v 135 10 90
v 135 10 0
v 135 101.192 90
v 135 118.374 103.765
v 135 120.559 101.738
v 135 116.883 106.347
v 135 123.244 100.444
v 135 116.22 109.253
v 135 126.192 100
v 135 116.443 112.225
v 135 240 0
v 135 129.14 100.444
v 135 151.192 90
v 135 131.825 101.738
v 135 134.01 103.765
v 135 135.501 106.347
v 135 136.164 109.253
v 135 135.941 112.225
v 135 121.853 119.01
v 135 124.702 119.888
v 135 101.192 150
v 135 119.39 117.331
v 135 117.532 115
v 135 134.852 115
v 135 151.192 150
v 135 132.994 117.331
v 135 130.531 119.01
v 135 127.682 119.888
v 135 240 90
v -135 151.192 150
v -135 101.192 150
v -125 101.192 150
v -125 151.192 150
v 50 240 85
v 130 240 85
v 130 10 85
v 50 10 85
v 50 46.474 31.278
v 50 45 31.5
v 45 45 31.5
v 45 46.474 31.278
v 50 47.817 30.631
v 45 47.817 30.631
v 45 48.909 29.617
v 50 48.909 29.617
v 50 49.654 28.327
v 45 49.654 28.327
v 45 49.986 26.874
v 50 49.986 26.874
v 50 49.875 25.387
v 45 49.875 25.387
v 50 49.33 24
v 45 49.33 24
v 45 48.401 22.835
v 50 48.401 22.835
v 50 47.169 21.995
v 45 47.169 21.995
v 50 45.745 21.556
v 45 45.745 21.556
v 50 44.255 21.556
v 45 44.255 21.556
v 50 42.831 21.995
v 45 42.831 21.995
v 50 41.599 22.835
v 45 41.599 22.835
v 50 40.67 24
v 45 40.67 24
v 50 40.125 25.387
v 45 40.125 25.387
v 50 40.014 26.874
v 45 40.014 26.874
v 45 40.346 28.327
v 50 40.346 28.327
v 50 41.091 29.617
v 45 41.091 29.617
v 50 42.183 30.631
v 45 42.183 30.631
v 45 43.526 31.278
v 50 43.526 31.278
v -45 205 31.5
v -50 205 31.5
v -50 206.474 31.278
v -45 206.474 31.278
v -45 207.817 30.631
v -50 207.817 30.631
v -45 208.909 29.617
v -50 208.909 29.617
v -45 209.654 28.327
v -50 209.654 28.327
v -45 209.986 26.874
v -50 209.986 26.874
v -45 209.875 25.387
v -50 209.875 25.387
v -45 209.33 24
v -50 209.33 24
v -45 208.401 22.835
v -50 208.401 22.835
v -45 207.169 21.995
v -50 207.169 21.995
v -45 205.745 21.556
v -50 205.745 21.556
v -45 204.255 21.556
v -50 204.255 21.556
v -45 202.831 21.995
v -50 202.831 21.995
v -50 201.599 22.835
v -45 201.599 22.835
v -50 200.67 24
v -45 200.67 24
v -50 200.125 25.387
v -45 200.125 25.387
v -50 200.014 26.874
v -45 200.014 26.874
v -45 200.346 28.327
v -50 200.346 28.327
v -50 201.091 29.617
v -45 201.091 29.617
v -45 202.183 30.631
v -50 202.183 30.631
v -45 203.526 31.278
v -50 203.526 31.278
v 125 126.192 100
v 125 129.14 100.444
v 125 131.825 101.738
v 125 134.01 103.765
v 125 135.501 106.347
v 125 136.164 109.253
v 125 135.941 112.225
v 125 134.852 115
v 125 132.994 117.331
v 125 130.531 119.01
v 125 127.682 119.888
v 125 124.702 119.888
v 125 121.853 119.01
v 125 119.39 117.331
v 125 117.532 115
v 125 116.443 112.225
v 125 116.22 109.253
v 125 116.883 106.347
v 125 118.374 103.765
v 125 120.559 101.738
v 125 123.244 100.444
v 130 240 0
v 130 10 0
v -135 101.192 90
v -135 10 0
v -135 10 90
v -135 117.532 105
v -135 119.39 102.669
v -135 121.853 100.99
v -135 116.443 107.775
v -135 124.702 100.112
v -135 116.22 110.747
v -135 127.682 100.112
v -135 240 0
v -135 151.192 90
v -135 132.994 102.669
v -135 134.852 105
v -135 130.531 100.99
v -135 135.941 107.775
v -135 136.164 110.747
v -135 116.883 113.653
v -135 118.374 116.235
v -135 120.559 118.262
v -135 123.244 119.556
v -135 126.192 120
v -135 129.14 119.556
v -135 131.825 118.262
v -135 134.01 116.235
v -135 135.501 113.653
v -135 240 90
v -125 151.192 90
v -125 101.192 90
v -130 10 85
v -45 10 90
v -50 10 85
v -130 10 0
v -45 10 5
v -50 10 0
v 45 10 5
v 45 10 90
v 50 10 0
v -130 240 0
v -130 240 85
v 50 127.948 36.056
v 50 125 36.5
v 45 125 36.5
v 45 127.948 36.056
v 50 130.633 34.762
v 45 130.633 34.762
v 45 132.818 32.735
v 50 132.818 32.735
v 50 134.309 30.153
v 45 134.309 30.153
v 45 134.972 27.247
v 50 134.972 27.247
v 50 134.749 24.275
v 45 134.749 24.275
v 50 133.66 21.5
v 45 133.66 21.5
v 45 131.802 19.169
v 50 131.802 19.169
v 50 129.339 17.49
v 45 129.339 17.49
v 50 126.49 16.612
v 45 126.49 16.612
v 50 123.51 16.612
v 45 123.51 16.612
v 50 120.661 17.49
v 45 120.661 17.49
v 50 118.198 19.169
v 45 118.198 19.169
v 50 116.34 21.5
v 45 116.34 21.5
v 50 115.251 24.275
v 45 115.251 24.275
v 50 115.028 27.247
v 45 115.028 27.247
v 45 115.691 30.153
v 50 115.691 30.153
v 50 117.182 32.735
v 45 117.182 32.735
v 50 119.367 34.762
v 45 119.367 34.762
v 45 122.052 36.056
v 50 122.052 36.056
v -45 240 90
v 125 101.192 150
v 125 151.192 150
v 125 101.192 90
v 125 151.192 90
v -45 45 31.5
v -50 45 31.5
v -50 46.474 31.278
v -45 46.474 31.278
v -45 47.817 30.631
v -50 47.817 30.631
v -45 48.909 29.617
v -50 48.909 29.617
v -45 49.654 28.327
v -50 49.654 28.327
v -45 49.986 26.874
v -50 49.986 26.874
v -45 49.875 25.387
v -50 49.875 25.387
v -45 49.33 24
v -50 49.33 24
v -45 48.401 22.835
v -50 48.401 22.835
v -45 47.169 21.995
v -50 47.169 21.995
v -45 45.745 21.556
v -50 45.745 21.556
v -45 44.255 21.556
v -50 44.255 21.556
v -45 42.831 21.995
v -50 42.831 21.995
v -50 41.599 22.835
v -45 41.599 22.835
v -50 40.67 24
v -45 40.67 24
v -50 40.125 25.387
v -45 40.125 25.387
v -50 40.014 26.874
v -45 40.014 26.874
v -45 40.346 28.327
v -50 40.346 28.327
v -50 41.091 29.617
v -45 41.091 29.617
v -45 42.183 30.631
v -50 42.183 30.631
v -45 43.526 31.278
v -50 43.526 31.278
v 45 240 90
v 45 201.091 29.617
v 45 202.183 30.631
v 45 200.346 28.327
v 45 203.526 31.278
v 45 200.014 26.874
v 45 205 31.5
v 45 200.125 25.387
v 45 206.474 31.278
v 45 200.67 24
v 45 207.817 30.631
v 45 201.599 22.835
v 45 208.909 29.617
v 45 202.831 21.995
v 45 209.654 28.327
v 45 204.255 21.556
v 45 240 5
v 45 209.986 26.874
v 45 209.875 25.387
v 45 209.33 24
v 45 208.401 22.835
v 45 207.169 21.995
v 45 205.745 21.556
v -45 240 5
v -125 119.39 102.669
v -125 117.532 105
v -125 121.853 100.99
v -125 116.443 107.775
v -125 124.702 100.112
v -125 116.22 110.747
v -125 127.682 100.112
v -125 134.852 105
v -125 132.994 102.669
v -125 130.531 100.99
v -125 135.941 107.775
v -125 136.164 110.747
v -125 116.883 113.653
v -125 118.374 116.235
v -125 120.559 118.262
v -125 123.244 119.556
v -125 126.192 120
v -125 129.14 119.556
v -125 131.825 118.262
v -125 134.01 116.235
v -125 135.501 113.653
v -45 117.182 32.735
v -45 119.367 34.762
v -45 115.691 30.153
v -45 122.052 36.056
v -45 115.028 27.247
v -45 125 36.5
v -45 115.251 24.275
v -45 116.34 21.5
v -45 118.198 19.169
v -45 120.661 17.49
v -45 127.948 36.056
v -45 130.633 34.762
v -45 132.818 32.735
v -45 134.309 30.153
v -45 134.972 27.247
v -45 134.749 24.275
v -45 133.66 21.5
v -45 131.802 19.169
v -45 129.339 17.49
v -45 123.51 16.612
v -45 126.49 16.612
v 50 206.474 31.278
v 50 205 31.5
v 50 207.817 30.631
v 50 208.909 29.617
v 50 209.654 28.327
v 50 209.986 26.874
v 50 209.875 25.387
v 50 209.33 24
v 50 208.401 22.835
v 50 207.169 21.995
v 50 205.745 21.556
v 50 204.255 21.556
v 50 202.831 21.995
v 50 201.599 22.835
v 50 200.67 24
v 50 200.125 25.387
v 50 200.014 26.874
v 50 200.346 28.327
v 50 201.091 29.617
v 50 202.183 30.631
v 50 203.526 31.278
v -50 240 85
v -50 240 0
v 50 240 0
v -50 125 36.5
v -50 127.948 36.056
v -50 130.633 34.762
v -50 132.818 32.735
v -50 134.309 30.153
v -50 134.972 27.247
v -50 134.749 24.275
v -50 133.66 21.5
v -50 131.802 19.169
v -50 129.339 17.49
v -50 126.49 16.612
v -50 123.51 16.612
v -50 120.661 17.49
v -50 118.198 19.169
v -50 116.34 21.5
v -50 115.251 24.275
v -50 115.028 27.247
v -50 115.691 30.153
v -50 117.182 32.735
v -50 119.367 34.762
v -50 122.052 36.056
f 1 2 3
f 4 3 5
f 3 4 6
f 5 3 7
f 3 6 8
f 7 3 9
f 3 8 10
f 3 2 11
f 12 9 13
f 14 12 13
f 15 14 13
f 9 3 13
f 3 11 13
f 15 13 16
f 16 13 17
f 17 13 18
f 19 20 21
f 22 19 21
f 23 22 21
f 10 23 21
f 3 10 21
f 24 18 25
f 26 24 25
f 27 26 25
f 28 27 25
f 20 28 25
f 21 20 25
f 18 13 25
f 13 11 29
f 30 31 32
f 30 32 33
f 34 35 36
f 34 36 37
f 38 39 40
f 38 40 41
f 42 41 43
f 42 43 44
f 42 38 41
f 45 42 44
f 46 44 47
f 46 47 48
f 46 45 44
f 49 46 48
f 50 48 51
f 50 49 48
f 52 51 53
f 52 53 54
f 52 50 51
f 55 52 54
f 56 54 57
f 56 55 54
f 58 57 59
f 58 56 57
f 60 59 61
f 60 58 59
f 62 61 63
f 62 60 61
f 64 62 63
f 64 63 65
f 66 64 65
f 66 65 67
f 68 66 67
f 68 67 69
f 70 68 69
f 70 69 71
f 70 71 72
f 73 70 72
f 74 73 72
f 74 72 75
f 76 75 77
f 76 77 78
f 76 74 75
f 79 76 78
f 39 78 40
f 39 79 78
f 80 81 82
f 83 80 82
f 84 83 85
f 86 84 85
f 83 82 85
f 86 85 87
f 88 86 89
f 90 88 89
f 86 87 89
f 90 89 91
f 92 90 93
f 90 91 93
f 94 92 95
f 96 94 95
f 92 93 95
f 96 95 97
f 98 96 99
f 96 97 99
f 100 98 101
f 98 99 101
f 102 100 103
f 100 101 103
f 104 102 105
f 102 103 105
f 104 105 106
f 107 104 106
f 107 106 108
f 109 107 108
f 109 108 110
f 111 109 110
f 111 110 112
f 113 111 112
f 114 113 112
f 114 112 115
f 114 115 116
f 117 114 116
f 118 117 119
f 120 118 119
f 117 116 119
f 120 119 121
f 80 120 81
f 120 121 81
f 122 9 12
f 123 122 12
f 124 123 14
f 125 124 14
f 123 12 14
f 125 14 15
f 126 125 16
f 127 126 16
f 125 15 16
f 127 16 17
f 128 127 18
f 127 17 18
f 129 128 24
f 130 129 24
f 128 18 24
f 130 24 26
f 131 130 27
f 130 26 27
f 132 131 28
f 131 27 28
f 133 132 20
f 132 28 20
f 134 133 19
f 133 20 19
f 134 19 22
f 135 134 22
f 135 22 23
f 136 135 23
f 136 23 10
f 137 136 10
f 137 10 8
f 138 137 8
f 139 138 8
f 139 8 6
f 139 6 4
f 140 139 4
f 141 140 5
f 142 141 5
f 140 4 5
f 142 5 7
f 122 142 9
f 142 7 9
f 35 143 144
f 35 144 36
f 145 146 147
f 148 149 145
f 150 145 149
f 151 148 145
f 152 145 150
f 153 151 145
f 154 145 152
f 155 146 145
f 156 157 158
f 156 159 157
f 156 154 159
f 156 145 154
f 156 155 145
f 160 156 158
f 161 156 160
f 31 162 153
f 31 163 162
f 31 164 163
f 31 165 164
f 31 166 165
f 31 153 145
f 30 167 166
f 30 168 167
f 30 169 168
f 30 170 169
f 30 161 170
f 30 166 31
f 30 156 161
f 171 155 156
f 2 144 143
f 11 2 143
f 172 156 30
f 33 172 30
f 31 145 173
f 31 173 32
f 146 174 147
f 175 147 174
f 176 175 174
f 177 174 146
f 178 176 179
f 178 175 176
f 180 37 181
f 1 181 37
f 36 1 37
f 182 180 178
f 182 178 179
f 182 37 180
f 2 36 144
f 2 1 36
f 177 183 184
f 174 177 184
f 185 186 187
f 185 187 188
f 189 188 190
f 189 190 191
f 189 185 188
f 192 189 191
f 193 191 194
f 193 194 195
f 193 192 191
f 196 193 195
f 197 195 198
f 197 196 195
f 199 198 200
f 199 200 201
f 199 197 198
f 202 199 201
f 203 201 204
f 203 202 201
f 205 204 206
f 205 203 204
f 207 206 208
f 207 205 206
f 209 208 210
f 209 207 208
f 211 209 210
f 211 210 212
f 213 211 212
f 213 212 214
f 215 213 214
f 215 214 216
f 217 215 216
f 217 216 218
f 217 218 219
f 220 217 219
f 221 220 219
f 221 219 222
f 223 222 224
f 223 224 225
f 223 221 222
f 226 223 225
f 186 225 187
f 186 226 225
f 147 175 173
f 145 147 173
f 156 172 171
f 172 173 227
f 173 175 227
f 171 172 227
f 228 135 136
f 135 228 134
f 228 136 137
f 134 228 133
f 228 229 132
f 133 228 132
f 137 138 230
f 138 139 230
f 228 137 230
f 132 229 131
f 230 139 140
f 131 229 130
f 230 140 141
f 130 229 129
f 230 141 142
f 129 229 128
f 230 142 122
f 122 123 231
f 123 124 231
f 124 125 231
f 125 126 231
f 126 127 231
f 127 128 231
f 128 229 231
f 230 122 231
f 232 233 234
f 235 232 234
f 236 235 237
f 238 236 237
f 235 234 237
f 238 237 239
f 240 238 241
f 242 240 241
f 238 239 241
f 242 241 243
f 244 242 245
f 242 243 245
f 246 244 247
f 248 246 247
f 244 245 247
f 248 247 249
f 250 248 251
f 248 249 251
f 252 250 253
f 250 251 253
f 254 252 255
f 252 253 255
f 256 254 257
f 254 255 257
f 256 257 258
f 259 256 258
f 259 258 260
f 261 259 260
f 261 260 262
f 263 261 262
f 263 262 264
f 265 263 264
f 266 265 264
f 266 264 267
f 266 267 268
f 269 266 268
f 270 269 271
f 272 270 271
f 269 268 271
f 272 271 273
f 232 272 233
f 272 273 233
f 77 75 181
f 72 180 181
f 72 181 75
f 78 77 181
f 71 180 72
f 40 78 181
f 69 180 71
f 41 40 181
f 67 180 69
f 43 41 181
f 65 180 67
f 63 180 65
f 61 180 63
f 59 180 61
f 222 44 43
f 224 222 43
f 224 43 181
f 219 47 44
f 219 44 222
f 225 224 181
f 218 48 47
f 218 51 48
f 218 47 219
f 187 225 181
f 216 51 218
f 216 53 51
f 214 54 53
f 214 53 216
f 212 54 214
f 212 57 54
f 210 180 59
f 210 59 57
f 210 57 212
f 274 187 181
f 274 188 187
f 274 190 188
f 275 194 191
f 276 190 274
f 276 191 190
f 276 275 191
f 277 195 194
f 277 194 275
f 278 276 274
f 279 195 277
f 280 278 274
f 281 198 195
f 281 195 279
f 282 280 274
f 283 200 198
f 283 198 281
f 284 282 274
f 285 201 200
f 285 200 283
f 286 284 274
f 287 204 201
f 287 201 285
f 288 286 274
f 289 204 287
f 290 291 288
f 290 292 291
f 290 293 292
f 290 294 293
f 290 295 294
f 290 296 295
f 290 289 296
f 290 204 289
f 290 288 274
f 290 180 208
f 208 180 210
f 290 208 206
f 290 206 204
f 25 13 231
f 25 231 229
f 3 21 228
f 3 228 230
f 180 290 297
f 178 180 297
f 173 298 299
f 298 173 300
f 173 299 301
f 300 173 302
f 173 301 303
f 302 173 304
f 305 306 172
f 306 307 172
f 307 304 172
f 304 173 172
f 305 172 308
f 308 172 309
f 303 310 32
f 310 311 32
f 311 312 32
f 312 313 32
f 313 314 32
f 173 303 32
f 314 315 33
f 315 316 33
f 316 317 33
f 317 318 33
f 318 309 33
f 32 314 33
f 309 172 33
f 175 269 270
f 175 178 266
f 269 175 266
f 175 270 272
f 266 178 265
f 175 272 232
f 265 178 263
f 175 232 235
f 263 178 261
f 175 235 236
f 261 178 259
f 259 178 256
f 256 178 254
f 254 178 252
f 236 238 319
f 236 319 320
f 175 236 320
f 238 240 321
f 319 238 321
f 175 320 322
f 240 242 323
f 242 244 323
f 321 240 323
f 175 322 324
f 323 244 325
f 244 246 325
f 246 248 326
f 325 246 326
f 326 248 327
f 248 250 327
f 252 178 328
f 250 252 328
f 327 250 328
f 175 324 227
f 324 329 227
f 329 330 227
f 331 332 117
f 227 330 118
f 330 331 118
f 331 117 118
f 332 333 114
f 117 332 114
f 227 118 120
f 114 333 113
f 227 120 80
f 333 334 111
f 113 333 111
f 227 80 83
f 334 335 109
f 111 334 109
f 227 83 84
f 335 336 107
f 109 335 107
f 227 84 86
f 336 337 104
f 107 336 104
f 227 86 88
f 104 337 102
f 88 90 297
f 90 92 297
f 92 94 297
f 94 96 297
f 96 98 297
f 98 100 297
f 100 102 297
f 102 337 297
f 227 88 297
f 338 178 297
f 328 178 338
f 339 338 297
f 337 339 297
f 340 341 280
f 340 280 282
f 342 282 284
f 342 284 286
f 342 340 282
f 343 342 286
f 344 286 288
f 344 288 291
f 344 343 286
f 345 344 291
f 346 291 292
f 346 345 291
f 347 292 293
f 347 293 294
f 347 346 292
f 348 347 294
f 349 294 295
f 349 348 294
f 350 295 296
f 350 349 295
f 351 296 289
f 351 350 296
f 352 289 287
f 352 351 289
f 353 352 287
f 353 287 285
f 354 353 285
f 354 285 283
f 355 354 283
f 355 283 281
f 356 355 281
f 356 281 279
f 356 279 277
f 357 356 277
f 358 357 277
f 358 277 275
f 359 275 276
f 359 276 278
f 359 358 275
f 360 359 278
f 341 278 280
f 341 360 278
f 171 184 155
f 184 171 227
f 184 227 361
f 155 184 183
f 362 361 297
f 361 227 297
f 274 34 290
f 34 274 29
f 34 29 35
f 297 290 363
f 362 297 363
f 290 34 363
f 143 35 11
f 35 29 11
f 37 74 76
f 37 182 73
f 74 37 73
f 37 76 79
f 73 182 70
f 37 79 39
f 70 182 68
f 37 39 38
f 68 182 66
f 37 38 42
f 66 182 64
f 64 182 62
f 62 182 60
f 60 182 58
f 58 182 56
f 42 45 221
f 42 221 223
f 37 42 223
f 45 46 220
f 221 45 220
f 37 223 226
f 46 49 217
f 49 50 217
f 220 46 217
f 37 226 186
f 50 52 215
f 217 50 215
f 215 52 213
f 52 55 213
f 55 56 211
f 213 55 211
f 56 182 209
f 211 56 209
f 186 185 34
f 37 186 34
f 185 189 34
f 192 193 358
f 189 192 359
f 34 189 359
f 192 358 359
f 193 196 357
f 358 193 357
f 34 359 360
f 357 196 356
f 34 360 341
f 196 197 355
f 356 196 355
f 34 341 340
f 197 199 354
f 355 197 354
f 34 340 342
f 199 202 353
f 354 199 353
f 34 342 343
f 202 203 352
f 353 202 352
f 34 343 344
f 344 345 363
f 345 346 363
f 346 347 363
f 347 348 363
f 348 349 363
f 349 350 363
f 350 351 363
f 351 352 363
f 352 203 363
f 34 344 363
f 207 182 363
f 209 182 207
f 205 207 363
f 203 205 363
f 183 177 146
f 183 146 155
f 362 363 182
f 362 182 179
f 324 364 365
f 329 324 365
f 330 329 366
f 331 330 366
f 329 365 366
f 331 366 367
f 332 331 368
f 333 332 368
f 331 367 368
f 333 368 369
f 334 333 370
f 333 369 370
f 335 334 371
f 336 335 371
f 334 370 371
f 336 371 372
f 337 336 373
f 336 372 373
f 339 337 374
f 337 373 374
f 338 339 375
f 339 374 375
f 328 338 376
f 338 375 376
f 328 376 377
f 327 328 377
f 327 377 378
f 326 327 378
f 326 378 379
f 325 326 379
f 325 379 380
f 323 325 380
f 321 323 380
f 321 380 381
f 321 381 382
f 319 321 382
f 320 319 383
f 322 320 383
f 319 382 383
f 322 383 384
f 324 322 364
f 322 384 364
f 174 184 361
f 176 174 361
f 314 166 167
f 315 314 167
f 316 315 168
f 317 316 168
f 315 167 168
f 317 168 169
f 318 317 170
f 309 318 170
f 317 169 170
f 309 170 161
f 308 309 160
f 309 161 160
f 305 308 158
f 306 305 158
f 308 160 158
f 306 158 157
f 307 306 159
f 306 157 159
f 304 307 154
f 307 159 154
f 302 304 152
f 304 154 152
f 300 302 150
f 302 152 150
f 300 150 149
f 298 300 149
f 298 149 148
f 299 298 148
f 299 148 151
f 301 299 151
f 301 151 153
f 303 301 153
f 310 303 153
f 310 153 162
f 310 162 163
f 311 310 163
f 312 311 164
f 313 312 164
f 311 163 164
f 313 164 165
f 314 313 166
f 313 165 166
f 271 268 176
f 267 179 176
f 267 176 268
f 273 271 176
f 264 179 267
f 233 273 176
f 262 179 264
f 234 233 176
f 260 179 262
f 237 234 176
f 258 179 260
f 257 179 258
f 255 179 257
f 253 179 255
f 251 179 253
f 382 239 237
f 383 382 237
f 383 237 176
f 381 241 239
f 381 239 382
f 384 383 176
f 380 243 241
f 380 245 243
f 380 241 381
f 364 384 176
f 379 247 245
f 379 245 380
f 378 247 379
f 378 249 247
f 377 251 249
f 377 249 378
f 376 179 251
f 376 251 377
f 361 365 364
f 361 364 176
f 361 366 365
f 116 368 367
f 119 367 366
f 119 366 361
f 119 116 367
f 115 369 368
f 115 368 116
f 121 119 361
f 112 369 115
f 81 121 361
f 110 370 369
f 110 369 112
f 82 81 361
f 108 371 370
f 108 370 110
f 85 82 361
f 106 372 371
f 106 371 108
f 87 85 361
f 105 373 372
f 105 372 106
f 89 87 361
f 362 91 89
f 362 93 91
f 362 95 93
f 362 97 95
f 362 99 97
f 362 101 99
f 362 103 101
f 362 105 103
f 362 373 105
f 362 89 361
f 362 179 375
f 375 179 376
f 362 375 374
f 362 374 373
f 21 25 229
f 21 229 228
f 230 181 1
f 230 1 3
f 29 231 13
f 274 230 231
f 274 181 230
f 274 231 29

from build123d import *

# Parameters (mm, degrees)
ESQUISSE1_W             = 50
ESQUISSE1_H             = 250
BOSS_EXTRU_1_DEPTH      = 5
ESQUISSE2_W             = 5
ESQUISSE2_H             = 250
BOSS_EXTRU_2_DEPTH      = 80
ESQUISSE3_W             = 85
ESQUISSE3_H             = 250
BOSS_EXTRU_3_DEPTH      = 5
ESQUISSE4_W             = 90
ESQUISSE4_H             = 250
BOSS_EXTRU_4_DEPTH      = 5
ESQUISSE5_R             = 10
ENL_V_MAT_EXTRU_1_DEPTH = 5
ESQUISSE6_R             = 5
ENL_V_MAT_EXTRU_2_DEPTH = 5
ESQUISSE8_R             = 20
ESQUISSE8_R_2           = 10
BOSS_EXTRU_5_DEPTH      = 10
ESQUISSE9_W             = 60
ESQUISSE9_H             = 50
ESQUISSE9_R             = 10
BOSS_EXTRU_6_DEPTH      = 10
ESQUISSE11_W            = 90
ESQUISSE11_H            = 10
ENL_V_MAT_EXTRU_6_DEPTH = 271


with BuildPart() as part:
    # Esquisse1 → Boss.-Extru.1 (new body)
    with BuildSketch(Plane.XY):
        with Locations((-25, 125)):
            Rectangle(ESQUISSE1_W, ESQUISSE1_H)
    boss_extru_1 = extrude(amount=BOSS_EXTRU_1_DEPTH)

    # Esquisse2 → Boss.-Extru.2 (add)
    with BuildSketch(Plane.XY.offset(5)):
        with Locations((-47.5, 125)):
            Rectangle(ESQUISSE2_W, ESQUISSE2_H)
    boss_extru_2 = extrude(amount=BOSS_EXTRU_2_DEPTH)

    # Esquisse3 → Boss.-Extru.3 (add)
    with BuildSketch(Plane.XY.offset(85)):
        with Locations((-87.5, 125)):
            Rectangle(ESQUISSE3_W, ESQUISSE3_H)
    boss_extru_3 = extrude(amount=BOSS_EXTRU_3_DEPTH)

    # Esquisse4 → Boss.-Extru.4 (add)
    with BuildSketch(Plane.ZY.offset(130)):
        with Locations((45, 125)):
            Rectangle(ESQUISSE4_W, ESQUISSE4_H)
    boss_extru_4 = extrude(amount=BOSS_EXTRU_4_DEPTH)

    # Esquisse5 → Enlèv. mat.-Extru.1 (cut)
    with BuildSketch(Plane.ZY.offset(50)):
        with Locations((26.5, 125)):
            Circle(ESQUISSE5_R)
    enl_v_mat_extru_1 = extrude(amount=-ENL_V_MAT_EXTRU_1_DEPTH, mode=Mode.SUBTRACT)

    # Esquisse6 → Enlèv. mat.-Extru.2 (cut)
    with BuildSketch(Plane.ZY.offset(50)):
        with Locations((26.5, 205)):
            Circle(ESQUISSE6_R)
        with Locations((26.5, 45)):
            Circle(ESQUISSE6_R)
    enl_v_mat_extru_2 = extrude(amount=-ENL_V_MAT_EXTRU_2_DEPTH, mode=Mode.SUBTRACT)

    # Symétrie2: Boss.-Extru.1, Boss.-Extru.2, Boss.-Extru.3, Boss.-Extru.4, Enlèv. mat.-Extru.1, Enlèv. mat.-Extru.2 across plane
    add(boss_extru_1.mirror(Plane(origin=(0, 0, 5), x_dir=(0, 0, 1), z_dir=(-1, 0, 0))))
    add(boss_extru_2.mirror(Plane(origin=(0, 0, 5), x_dir=(0, 0, 1), z_dir=(-1, 0, 0))))
    add(boss_extru_3.mirror(Plane(origin=(0, 0, 5), x_dir=(0, 0, 1), z_dir=(-1, 0, 0))))
    add(boss_extru_4.mirror(Plane(origin=(0, 0, 5), x_dir=(0, 0, 1), z_dir=(-1, 0, 0))))
    add(enl_v_mat_extru_1.mirror(Plane(origin=(0, 0, 5), x_dir=(0, 0, 1), z_dir=(-1, 0, 0))), mode=Mode.SUBTRACT)
    add(enl_v_mat_extru_2.mirror(Plane(origin=(0, 0, 5), x_dir=(0, 0, 1), z_dir=(-1, 0, 0))), mode=Mode.SUBTRACT)

    # Esquisse8 → Boss.-Extru.5 (add)
    with BuildSketch(Plane(origin=(135, 0, 0), x_dir=(0, 0, -1), z_dir=(1, 0, 0))):
        Polygon((-90, 101.191980235), (-90, 125), (-90, 126.191980235), (-90, 151.191980235), (-150, 151.191980235), (-150, 125), (-150, 101.191980235), align=None)
        with Locations((-110, 126.191980235)):
            Circle(ESQUISSE8_R, mode=Mode.SUBTRACT)
        with Locations((-110, 126.191980235)):
            Circle(ESQUISSE8_R)
        with Locations((-110, 126.191980235)):
            Circle(ESQUISSE8_R_2, mode=Mode.SUBTRACT)
    extrude(amount=-BOSS_EXTRU_5_DEPTH)

    # Esquisse9 → Boss.-Extru.6 (add)
    with BuildSketch(Plane.ZY.offset(135)):
        with Locations((120, 126.191980235)):
            Rectangle(ESQUISSE9_W, ESQUISSE9_H)
        with Locations((110, 126.191980235)):
            Circle(ESQUISSE9_R, mode=Mode.SUBTRACT)
    extrude(amount=-BOSS_EXTRU_6_DEPTH)

    # Esquisse11 → Enlèv. mat.-Extru.6 (cut, through all)
    with BuildSketch(Plane(origin=(135, 0, 0), x_dir=(0, 0, -1), z_dir=(1, 0, 0))):
        with Locations((-45, 5)):
            Rectangle(ESQUISSE11_W, ESQUISSE11_H)
        with Locations((-45, 245)):
            Rectangle(ESQUISSE11_W, ESQUISSE11_H)
    extrude(amount=-ENL_V_MAT_EXTRU_6_DEPTH, mode=Mode.SUBTRACT)


solid = part.part
